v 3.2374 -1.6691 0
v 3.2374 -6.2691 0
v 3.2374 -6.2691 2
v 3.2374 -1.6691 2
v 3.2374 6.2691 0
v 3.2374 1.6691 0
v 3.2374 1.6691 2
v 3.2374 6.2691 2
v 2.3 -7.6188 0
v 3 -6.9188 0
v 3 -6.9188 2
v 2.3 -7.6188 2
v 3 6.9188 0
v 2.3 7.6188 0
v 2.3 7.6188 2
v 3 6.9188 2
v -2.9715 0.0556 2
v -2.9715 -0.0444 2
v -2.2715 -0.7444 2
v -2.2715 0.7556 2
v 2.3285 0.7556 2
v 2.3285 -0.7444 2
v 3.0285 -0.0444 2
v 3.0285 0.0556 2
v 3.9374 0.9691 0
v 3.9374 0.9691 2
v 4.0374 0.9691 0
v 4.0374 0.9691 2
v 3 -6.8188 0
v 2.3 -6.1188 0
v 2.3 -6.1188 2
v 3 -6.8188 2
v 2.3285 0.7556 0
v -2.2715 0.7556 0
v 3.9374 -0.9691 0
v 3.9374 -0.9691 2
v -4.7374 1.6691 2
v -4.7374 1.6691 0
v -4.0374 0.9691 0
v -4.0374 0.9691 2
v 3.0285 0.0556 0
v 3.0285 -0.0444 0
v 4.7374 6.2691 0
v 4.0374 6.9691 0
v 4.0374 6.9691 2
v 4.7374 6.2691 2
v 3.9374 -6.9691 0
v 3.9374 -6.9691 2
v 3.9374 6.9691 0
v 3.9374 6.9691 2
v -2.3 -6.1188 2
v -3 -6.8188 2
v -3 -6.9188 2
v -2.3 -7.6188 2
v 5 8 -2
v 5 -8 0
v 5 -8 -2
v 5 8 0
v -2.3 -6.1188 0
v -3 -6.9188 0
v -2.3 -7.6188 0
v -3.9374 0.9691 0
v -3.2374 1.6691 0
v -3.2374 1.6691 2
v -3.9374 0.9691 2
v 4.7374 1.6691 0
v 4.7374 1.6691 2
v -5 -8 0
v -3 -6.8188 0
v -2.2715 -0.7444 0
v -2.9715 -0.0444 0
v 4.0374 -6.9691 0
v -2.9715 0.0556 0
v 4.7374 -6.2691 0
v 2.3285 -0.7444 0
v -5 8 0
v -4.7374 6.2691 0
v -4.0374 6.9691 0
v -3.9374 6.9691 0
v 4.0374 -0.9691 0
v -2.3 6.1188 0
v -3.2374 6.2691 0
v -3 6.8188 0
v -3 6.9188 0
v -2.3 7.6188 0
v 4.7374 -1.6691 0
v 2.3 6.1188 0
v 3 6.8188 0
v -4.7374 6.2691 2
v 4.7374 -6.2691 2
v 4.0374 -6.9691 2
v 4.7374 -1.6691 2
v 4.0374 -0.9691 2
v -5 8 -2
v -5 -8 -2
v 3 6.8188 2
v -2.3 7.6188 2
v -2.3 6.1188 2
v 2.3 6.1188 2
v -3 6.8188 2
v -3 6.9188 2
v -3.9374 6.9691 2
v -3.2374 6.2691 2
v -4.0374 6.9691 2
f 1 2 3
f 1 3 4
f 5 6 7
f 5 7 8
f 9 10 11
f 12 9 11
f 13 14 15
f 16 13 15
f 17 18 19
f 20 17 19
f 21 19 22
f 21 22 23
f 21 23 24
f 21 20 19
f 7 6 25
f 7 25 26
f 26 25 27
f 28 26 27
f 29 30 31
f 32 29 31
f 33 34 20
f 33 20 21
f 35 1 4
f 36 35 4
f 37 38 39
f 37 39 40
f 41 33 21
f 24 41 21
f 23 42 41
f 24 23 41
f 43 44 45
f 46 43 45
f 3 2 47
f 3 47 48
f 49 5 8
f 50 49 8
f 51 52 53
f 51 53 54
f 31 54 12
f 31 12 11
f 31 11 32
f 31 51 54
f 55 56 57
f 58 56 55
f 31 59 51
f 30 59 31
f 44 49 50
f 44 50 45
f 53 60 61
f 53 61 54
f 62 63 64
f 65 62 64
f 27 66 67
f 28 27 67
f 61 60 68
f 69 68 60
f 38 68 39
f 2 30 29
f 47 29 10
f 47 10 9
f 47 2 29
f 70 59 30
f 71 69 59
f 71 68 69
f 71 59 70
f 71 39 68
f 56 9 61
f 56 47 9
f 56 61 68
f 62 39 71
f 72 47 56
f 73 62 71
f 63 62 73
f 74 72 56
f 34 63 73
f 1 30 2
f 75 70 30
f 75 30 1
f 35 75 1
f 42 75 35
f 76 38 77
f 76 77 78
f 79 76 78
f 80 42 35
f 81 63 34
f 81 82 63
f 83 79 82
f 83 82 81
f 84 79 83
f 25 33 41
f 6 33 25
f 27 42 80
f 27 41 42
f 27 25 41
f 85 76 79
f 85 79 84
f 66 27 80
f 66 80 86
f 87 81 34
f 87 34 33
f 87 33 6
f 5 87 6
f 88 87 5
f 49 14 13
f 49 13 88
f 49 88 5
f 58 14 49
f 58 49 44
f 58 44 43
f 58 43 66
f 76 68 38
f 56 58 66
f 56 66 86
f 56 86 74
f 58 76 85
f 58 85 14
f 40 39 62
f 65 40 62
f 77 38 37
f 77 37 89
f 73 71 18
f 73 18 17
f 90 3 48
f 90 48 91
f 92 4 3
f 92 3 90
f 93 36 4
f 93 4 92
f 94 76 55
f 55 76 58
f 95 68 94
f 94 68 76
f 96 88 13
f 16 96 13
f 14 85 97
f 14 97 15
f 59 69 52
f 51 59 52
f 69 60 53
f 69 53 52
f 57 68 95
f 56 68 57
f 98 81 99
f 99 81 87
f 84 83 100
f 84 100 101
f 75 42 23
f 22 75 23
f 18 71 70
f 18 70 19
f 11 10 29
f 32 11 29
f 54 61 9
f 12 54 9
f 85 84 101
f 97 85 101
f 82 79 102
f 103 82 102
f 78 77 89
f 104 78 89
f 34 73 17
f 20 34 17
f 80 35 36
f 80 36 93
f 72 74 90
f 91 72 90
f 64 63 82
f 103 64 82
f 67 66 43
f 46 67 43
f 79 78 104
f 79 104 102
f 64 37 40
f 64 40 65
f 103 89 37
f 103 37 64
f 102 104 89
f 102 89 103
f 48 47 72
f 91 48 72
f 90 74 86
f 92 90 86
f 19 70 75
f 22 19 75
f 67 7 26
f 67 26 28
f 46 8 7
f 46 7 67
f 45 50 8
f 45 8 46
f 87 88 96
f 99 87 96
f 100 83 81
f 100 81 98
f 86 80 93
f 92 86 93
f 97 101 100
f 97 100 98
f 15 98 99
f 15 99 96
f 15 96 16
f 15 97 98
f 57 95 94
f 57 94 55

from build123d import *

# Parameters (mm, degrees)
F0_W     = 10
F0_H     = 16
F1_DEPTH = 2
F2_W     = 1.5
F2_H     = 6
F2_W_2   = 6
F2_H_2   = 1.5
F3_DEPTH = 2
F4_SIZE  = 0.7


# Not quite as in the source:
# - a feature names something its author has since deleted; it is built from what else it names


with BuildPart() as f1:
    # F0 (on Top) → F1 (new body)
    with BuildSketch(Plane.XY):
        Rectangle(F0_W, F0_H)
    extrude(amount=-F1_DEPTH)

    # F2 (on face) → F3 (join)
    with BuildSketch(Plane.XY):
        with Locations((-3.9874258153, 3.9691079506)):
            Rectangle(F2_W, F2_H)
        with Locations((0, 6.8687610328)):
            Rectangle(F2_W_2, F2_H_2)
        with Locations((3.9874258153, 3.9691079506)):
            Rectangle(F2_W, F2_H)
        with Locations((0.0284713751, 0.0055548735)):
            Rectangle(F2_W_2, F2_H_2)
        with Locations((0, -6.8687610328)):
            Rectangle(F2_W_2, F2_H_2)
        with Locations((3.9874258153, -3.9691079506)):
            Rectangle(F2_W, F2_H)
    extrude(amount=F3_DEPTH)

    # F4
    f4_edges = [f1.edges().sort_by_distance(p)[0] for p in [
        (3, 6.118761, 1),
        (3.237426, 6.969108, 1),
        (3.237426, 0.969108, 1),
        (4.737426, 0.969108, 1),
        (3.237426, -0.969108, 1),
        (3.028471, -0.744445, 1),
        (-2.971529, -0.744445, 1),
        (-2.971529, 0.755555, 1),
        (-3.237426, 0.969108, 1),
        (-4.737426, 0.969108, 1),
        (-4.737426, 6.969108, 1),
        (-3, 6.118761, 1),
        (-3, 7.618761, 1),
        (3.237426, -6.969108, 1),
        (4.737426, -6.969108, 1),
        (3, -7.618761, 1),
        (-3, -7.618761, 1),
        (-3, -6.118761, 1),
        (3.028471, 0.755555, 1),
        (4.737426, -0.969108, 1),
        (3, -6.118761, 1),
        (4.737426, 6.969108, 1),
        (3, 7.618761, 1),
        (-3.237426, 6.969108, 1),
    ]]
    chamfer(f4_edges, length=F4_SIZE)


solid = f1.part
